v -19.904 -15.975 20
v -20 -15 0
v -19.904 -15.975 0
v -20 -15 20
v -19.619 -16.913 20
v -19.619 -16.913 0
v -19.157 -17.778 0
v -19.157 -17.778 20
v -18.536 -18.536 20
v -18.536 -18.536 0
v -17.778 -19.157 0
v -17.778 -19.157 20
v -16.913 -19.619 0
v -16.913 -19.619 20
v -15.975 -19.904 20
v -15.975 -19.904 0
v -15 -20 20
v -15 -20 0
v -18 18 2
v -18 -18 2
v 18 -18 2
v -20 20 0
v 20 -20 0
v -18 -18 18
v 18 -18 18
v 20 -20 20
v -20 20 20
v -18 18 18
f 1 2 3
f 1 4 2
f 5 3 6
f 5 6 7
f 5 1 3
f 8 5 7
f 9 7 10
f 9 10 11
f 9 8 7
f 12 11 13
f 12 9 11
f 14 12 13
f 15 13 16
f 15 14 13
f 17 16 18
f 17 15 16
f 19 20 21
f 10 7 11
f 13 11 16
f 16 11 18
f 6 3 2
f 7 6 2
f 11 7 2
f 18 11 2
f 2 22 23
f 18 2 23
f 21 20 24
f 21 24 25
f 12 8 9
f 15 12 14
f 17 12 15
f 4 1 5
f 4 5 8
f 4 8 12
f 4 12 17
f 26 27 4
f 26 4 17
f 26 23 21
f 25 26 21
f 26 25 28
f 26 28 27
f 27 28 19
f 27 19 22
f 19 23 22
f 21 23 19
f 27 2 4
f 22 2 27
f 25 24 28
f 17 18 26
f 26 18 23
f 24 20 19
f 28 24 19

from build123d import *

# Parameters (mm, degrees)
F0_W        = 40
F0_H        = 40
F1_DEPTH    = 20
F2_T        = -2
F3_T1_DEPTH = 207.7346390373
F4_R        = 5


# Not quite as in the source:
# - a fillet or chamfer that OpenCascade refuses, or shapes differently, is made with other operations: its cross-section is extruded or revolved along the edge and cut away or added


with BuildPart() as f1:
    # F0 (on Top) → F1 (new body)
    with BuildSketch(Plane.XY):
        Rectangle(F0_W, F0_H)
    extrude(amount=F1_DEPTH)

    # F2
    f2_openings = [f1.faces().sort_by_distance(p)[0] for p in [
        (20, 0, 10),
        (0, 20, 10),
    ]]
    offset(amount=F2_T, openings=f2_openings)

    # F3: chamfer of 40 on 6 edges, made by hand

    # F3_s2 → F3_t1 (cut)
    with BuildSketch(Plane.XY.offset(-102.8673195186)):
        Polygon((20, -20), (-20, 20), (20, 20), align=None)
    extrude(amount=F3_T1_DEPTH, mode=Mode.SUBTRACT)

    # F4
    f4_edges = [f1.edges().sort_by_distance(p)[0] for p in [
        (-20, -20, 10),
    ]]
    fillet(f4_edges, radius=F4_R)


solid = f1.part
